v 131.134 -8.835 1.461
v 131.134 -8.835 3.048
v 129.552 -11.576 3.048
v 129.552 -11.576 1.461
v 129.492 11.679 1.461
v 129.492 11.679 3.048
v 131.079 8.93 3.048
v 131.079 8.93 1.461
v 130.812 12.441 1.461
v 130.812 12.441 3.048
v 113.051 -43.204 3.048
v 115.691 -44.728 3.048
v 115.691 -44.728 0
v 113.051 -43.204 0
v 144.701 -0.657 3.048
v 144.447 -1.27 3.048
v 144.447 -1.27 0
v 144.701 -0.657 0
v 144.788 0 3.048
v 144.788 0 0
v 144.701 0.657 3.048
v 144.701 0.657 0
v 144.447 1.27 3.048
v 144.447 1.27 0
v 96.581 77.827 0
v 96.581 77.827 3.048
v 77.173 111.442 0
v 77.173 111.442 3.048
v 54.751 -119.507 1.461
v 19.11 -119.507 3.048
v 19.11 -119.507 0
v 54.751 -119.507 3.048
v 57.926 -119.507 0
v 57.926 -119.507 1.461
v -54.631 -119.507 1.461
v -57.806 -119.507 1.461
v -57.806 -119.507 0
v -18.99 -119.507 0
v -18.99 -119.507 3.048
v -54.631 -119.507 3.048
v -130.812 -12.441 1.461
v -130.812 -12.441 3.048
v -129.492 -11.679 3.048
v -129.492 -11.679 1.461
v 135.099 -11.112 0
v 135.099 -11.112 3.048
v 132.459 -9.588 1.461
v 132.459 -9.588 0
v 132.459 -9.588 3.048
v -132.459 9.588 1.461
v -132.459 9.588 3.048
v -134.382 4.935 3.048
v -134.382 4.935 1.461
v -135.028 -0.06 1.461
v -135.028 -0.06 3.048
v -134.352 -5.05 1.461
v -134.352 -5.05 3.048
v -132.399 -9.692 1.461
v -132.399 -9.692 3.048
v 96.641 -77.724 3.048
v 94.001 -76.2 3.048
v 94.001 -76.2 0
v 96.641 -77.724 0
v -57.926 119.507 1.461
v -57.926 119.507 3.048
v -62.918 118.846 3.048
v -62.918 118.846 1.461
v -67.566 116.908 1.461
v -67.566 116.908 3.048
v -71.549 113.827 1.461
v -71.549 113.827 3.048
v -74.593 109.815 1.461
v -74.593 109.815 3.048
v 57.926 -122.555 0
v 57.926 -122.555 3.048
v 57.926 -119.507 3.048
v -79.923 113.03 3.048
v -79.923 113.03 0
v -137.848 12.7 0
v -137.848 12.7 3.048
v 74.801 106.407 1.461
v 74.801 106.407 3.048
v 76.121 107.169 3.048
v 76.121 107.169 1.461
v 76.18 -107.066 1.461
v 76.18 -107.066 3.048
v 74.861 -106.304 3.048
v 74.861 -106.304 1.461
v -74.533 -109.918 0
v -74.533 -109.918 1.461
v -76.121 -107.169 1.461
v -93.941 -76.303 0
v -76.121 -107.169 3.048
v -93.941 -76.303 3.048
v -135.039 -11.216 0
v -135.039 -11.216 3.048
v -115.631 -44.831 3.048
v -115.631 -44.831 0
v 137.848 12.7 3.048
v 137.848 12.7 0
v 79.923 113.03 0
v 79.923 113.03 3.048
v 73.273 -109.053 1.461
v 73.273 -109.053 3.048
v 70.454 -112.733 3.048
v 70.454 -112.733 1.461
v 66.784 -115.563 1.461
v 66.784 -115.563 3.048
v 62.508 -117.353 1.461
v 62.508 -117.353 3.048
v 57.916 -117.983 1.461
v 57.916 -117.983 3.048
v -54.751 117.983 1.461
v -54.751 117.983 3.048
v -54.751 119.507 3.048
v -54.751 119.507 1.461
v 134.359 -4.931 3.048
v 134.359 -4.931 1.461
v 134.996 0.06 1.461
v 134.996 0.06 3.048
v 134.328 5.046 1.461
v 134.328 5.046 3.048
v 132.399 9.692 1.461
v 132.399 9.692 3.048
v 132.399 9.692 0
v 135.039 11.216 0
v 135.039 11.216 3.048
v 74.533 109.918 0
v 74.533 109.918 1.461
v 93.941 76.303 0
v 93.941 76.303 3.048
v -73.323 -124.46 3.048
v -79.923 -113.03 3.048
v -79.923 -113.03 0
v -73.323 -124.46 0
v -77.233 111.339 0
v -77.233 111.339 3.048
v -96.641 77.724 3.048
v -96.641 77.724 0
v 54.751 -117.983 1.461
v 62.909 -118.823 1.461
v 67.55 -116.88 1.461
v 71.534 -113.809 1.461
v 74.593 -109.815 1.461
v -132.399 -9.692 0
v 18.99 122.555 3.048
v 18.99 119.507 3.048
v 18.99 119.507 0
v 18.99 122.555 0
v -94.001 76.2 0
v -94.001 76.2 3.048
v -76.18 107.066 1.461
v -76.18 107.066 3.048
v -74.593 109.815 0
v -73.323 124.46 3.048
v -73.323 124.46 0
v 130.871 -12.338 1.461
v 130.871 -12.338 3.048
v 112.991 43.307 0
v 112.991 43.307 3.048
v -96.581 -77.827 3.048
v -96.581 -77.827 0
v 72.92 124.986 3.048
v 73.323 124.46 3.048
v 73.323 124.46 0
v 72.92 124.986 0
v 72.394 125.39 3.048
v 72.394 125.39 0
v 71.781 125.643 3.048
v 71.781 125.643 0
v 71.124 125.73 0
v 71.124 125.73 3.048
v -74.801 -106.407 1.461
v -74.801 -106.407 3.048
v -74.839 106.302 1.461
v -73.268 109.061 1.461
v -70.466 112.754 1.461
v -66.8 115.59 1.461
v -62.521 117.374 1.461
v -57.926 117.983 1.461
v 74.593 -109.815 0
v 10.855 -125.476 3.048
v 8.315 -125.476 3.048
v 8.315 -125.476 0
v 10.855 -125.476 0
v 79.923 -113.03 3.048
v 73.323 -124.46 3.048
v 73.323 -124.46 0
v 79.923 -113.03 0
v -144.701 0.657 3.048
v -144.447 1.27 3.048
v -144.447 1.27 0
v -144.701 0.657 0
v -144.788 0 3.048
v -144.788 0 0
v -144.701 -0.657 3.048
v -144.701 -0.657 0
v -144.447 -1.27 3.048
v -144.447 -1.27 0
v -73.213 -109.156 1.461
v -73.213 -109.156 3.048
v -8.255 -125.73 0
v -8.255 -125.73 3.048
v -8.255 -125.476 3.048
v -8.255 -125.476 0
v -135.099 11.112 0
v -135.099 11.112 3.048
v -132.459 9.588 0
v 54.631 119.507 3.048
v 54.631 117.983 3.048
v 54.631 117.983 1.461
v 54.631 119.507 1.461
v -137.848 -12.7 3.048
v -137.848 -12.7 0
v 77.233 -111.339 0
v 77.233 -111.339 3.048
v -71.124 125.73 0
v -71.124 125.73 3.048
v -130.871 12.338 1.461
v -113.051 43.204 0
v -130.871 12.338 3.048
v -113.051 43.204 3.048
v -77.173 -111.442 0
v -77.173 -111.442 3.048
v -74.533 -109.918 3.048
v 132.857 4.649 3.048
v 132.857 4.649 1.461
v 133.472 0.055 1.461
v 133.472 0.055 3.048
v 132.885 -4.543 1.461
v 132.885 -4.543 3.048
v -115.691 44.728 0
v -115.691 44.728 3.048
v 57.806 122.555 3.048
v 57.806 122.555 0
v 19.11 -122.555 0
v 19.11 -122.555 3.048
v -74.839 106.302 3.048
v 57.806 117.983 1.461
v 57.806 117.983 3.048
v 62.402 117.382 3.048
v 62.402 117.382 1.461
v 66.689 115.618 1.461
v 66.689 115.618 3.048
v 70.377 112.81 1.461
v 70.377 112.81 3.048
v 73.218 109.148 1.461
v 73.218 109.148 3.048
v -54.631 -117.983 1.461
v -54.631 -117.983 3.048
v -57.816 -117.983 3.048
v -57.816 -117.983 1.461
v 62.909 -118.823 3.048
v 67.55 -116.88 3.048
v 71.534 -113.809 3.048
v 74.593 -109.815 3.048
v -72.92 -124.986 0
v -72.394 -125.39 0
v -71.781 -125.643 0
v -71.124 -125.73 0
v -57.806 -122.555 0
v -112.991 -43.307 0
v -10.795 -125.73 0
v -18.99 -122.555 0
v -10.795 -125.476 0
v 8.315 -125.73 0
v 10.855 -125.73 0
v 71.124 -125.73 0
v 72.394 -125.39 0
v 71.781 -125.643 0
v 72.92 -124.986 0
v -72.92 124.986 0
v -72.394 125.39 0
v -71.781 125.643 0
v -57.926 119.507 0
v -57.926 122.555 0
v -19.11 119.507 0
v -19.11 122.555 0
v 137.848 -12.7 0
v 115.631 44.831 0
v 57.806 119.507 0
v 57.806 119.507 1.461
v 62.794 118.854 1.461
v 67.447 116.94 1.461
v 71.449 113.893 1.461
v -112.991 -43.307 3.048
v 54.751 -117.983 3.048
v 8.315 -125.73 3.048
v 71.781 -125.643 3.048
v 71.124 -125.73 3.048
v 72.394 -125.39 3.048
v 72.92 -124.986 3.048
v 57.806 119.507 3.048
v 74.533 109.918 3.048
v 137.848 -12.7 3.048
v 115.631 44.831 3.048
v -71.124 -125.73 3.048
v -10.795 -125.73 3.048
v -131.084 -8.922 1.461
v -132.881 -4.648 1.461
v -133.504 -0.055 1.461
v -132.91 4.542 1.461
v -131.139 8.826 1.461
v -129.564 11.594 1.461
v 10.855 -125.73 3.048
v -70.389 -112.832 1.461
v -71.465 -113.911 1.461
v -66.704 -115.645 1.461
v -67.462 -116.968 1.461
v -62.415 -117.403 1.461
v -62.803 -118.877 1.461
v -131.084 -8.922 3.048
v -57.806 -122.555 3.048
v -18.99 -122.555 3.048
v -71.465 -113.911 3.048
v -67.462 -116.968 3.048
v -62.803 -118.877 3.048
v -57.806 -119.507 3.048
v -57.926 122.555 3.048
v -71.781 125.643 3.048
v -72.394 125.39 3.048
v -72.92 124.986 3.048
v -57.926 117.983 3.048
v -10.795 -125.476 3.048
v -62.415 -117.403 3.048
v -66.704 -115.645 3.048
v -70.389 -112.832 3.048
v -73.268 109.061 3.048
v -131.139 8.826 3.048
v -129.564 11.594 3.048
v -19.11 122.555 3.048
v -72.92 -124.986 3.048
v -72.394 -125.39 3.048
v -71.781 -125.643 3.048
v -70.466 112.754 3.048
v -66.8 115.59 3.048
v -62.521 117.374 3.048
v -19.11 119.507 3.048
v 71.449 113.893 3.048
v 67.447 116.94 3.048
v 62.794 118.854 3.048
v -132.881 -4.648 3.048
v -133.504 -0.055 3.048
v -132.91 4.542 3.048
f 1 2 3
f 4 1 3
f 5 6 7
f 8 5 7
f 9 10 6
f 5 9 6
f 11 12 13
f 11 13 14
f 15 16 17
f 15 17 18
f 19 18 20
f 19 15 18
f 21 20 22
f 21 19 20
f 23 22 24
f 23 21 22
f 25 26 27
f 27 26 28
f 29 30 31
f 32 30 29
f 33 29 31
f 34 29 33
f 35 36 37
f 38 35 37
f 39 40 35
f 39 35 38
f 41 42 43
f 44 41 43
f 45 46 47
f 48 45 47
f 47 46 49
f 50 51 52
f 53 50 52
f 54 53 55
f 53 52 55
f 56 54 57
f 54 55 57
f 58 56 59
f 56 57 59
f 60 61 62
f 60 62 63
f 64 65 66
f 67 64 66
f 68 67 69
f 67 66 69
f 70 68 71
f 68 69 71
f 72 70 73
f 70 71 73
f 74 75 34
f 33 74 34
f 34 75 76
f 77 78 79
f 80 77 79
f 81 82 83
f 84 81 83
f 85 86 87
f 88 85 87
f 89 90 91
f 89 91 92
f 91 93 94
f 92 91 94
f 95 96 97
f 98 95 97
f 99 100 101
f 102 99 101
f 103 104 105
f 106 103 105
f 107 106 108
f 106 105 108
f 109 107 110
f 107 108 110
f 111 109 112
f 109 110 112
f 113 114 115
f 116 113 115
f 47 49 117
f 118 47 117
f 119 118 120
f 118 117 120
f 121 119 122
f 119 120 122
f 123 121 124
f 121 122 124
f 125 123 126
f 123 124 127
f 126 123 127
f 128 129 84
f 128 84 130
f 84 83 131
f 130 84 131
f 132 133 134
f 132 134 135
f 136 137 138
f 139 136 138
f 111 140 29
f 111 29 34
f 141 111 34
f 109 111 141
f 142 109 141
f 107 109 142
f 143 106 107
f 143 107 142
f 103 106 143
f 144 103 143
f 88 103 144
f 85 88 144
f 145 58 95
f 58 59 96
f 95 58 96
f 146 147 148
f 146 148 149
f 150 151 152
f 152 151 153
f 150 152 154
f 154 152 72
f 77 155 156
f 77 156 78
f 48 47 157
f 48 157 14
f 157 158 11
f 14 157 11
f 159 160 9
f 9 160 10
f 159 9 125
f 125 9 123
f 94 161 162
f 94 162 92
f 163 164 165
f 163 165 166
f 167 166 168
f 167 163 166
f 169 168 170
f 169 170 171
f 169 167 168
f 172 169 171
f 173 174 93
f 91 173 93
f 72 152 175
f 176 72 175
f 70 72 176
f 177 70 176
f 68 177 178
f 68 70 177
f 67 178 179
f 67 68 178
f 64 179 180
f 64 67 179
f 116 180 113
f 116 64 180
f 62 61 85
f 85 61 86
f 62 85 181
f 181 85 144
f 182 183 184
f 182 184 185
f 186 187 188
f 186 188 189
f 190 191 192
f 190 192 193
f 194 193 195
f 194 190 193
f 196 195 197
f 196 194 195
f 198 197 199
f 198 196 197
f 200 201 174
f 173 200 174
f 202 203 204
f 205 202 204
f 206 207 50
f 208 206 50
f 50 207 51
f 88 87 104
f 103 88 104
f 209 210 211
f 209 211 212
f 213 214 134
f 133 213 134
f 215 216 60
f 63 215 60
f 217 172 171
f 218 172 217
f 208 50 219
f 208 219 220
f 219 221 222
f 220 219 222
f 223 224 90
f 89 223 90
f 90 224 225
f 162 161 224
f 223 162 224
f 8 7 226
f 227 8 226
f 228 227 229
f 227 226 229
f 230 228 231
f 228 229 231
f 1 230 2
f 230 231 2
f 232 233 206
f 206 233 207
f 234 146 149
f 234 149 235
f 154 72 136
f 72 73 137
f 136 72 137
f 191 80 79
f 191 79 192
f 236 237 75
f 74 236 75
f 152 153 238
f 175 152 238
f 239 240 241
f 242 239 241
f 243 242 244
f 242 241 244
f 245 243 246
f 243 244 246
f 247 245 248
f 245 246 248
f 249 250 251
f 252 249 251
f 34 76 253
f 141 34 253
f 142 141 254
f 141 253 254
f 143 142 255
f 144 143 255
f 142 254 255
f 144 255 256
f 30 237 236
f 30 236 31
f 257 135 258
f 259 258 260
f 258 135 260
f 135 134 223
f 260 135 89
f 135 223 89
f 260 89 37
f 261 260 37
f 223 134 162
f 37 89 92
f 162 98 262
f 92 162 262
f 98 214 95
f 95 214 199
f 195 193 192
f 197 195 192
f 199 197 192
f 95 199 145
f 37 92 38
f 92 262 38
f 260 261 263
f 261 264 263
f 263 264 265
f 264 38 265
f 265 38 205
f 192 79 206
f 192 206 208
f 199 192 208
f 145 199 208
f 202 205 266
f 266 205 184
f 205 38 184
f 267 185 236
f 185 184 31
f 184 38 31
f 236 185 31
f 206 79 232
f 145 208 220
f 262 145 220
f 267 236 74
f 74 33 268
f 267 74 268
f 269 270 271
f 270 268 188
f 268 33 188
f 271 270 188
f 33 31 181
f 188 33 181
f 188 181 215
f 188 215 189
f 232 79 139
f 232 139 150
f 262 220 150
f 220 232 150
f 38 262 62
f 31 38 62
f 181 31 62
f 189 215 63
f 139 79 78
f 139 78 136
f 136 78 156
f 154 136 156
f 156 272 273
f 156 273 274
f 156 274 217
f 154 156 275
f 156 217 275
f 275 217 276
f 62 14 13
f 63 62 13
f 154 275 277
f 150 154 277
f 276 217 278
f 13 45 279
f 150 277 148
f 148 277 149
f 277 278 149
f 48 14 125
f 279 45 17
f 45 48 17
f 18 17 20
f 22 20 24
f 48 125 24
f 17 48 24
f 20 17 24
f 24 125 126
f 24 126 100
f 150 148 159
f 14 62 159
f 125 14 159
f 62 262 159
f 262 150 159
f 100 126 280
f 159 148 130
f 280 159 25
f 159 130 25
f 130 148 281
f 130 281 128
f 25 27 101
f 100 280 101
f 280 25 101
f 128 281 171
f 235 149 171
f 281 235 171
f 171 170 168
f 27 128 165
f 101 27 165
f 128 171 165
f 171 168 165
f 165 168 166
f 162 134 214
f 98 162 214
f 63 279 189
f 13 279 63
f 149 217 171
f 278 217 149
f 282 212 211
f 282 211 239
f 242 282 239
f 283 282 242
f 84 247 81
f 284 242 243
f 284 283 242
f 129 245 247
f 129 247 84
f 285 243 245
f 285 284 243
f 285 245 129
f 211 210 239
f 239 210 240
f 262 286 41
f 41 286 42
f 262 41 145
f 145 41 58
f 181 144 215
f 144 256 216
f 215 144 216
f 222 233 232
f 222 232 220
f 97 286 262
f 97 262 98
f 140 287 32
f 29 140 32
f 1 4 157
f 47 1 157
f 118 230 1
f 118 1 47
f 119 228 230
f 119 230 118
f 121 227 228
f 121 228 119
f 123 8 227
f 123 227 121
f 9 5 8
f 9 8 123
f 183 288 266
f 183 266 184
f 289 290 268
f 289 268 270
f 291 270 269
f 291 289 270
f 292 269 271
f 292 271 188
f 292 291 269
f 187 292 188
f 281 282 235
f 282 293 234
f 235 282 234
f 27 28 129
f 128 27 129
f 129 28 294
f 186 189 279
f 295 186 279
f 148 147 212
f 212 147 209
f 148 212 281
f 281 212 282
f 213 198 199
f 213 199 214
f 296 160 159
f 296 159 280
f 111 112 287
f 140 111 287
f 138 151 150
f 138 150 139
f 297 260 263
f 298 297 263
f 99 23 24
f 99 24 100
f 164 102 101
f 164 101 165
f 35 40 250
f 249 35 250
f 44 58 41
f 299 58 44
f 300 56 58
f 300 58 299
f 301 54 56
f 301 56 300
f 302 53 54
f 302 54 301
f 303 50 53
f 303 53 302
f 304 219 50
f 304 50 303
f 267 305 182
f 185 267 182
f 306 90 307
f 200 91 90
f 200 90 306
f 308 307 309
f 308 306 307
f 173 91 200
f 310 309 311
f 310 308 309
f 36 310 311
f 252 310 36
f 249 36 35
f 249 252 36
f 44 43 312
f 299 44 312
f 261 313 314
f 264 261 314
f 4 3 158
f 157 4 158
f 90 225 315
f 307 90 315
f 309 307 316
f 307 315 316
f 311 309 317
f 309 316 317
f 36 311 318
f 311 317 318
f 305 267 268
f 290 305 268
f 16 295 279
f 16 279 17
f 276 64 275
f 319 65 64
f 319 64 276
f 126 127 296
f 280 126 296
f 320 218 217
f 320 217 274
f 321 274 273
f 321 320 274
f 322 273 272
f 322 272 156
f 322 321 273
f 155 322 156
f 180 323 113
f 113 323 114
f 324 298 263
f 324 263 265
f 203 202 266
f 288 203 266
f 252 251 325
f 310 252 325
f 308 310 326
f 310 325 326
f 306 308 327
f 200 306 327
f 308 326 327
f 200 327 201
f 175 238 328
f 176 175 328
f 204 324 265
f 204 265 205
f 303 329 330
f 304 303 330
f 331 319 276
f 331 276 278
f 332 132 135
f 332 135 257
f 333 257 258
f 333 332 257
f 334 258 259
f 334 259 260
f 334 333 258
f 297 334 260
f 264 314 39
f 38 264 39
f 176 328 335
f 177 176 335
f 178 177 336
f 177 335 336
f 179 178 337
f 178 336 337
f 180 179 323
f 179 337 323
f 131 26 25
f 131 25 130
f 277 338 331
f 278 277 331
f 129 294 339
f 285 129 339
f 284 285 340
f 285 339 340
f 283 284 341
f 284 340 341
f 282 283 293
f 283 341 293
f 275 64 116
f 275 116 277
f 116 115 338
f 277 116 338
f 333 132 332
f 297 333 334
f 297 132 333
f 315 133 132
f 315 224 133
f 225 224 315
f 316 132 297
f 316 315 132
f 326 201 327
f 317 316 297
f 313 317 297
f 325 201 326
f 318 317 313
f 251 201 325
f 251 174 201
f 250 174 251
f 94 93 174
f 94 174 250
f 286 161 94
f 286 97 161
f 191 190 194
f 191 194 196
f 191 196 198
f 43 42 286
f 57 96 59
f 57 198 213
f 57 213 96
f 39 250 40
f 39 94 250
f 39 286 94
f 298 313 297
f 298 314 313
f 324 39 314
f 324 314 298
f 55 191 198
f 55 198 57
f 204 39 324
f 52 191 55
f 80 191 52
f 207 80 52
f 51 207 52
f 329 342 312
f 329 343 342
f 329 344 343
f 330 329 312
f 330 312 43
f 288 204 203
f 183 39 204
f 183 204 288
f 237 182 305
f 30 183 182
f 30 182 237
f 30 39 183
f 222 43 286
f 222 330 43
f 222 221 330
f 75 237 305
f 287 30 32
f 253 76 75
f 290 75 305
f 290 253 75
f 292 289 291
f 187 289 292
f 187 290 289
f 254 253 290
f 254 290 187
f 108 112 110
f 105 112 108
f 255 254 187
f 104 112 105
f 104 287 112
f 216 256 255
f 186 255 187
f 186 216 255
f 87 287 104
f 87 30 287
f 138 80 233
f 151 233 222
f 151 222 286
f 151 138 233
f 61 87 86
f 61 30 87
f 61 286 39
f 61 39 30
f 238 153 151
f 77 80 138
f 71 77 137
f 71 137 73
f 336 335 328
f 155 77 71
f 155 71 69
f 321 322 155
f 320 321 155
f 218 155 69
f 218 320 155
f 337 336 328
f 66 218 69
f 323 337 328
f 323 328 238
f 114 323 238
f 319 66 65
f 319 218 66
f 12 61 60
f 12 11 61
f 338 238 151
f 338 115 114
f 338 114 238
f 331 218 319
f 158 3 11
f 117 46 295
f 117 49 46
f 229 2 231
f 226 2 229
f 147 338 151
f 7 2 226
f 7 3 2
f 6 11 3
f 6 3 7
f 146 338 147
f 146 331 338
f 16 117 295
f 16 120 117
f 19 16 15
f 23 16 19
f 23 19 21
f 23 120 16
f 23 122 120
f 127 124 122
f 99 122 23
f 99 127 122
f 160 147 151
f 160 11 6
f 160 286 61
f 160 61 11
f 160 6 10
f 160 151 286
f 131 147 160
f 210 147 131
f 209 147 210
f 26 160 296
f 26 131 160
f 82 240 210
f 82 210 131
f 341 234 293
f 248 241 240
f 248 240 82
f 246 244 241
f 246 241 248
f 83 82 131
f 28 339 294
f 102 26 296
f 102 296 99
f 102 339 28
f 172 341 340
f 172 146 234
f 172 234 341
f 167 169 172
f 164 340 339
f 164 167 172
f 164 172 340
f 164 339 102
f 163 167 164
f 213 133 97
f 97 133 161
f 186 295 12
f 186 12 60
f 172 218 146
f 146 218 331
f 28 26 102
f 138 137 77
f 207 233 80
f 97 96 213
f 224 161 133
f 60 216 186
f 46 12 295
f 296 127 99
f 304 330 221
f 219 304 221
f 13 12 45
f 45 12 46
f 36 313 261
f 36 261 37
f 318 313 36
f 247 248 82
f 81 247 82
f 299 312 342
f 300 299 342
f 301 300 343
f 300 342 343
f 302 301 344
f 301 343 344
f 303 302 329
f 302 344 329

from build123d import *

# Parameters (mm, degrees)
F1_DEPTH  = 3.048
F2_W      = 115.7319251503
F2_H      = 3.048
F3_DEPTH  = 3.049
F5_W      = 2.54
F5_H      = 0.254
F6_DEPTH  = 3.049
F8_DEPTH  = 3.048
F9_W      = 3.175
F9_H      = 1.524
F10_DEPTH = 1.5875
F11_W     = 38.1
F11_H     = 3.048
F12_DEPTH = 3.048


with BuildPart() as f1:
    # F0 (on Top) → F1 (new body)
    with BuildSketch(Plane.XY):
        with BuildLine():
            Line((-79.9225977639, 113.03), (-137.8481502717, 12.7))
            ThreePointArc((-137.8481502717, 12.7), (-141.2511050156, 0), (-137.8481502717, -12.7))
            Line((-137.8481502717, -12.7), (-79.9225977639, -113.03))
            ThreePointArc((-79.9225977639, -113.03), (-70.6255525078, -122.3270452561), (-57.9255525078, -125.73))
            Line((-57.9255525078, -125.73), (57.9255525078, -125.73))
            ThreePointArc((57.9255525078, -125.73), (70.6255525078, -122.3270452561), (79.9225977639, -113.03))
            Line((79.9225977639, -113.03), (137.8481502717, -12.7))
            ThreePointArc((137.8481502717, -12.7), (141.2511050156, 0), (137.8481502717, 12.7))
            Line((137.8481502717, 12.7), (79.9225977639, 113.03))
            ThreePointArc((79.9225977639, 113.03), (70.6255525078, 122.3270452561), (57.9255525078, 125.73))
            Line((57.9255525078, 125.73), (-57.9255525078, 125.73))
            ThreePointArc((-57.9255525078, 125.73), (-70.6255525078, 122.3270452561), (-79.9225977639, 113.03))
        make_face()
    extrude(amount=F1_DEPTH)

    # F2 (on face) → F3 (cut, through all)
    with BuildSketch(Plane.XY.offset(3.048)):
        Polygon((-135.0389296821, -11.215712791), (-77.1729671069, -111.4425), (-74.5333216761, -109.9185), (-132.3992842513, -9.6917127909), align=None)
        Polygon((-77.2325570395, 111.339287209), (-135.0985196147, 11.1125), (-132.4588741839, 9.5885), (-74.5929116088, 109.8152872091), align=None)
        with Locations((-0.0595899326, 121.031)):
            Rectangle(F2_W, F2_H)
        Polygon((135.0389296821, 11.215712791), (77.1729671069, 111.4425), (74.5333216761, 109.9185), (132.3992842513, 9.691712791), align=None)
        Polygon((77.2325570395, -111.339287209), (135.0985196147, -11.1125), (132.4588741839, -9.5885), (74.5929116088, -109.815287209), align=None)
        with Locations((0.0595899326, -121.031)):
            Rectangle(F2_W, F2_H)
    extrude(amount=-F3_DEPTH, mode=Mode.SUBTRACT)

    # F5 (on face) → F6 (cut, through all)
    with BuildSketch(Plane.XY.offset(3.048)):
        with Locations((-9.525, -125.603)):
            Rectangle(F5_W, F5_H)
        with Locations((9.5845899326, -125.603)):
            Rectangle(F5_W, F5_H)
    extrude(amount=-F6_DEPTH, mode=Mode.SUBTRACT)

    # F7 (on face) → F8 (join)
    with BuildSketch(Plane.XY.offset(3.048)):
        with BuildLine():
            Line((-73.3234841871, 124.46), (-79.9225977639, 113.03))
            Line((-79.9225977639, 113.03), (-57.9255525078, 125.73))
            Line((-57.9255525078, 125.73), (-71.1237796615, 125.73))
            ThreePointArc((-71.1237796615, 125.73), (-72.3937796615, 125.3897045256), (-73.3234841871, 124.46))
        make_face()
        with BuildLine():
            ThreePointArc((-137.8481502717, -12.7), (-141.2511050156, 0), (-137.8481502717, 12.7))
            Line((-137.8481502717, 12.7), (-144.4472638486, 1.27))
            ThreePointArc((-144.4472638486, 1.27), (-144.7875593229, 0), (-144.4472638486, -1.27))
            Line((-144.4472638486, -1.27), (-137.8481502717, -12.7))
        make_face()
        with BuildLine():
            ThreePointArc((-57.9255525078, -125.73), (-70.6255525078, -122.3270452561), (-79.9225977639, -113.03))
            Line((-79.9225977639, -113.03), (-73.3234841871, -124.46))
            ThreePointArc((-73.3234841871, -124.46), (-72.3937796615, -125.3897045256), (-71.1237796615, -125.73))
            Line((-71.1237796615, -125.73), (-57.9255525078, -125.73))
        make_face()
        with BuildLine():
            Line((73.3234841871, -124.46), (79.9225977639, -113.03))
            ThreePointArc((79.9225977639, -113.03), (70.6255525078, -122.3270452561), (57.9255525078, -125.73))
            Line((57.9255525078, -125.73), (71.1237796615, -125.73))
            ThreePointArc((71.1237796615, -125.73), (72.3937796615, -125.3897045256), (73.3234841871, -124.46))
        make_face()
        with BuildLine():
            Line((144.4472638486, 1.27), (137.8481502717, 12.7))
            ThreePointArc((137.8481502717, 12.7), (141.2511050156, 0), (137.8481502717, -12.7))
            Line((137.8481502717, -12.7), (144.4472638486, -1.27))
            ThreePointArc((144.4472638486, -1.27), (144.7875593229, 0), (144.4472638486, 1.27))
        make_face()
        with BuildLine():
            Line((71.1237796615, 125.73), (57.9255525078, 125.73))
            ThreePointArc((57.9255525078, 125.73), (70.6255525078, 122.3270452561), (79.9225977639, 113.03))
            Line((79.9225977639, 113.03), (73.3234841871, 124.46))
            ThreePointArc((73.3234841871, 124.46), (72.3937796615, 125.3897045256), (71.1237796615, 125.73))
        make_face()
    extrude(amount=-F8_DEPTH)

    # F9 (on face) → F10 (cut)
    with BuildSketch(Plane.XY.offset(3.048)):
        with BuildLine():
            Line((-57.9255525078, 117.983), (-57.9255525078, 119.507))
            ThreePointArc((-57.9255525078, 119.507), (-67.5657049473, 116.9079552121), (-74.5929116088, 109.8152872091))
            Line((-74.5929116088, 109.8152872091), (-73.2684038811, 109.0614601206))
            ThreePointArc((-73.2684038811, 109.0614601206), (-66.7996293906, 115.5904939256), (-57.9255525078, 117.983))
        make_face()
        with Locations((-56.3380525078, 118.745)):
            Rectangle(F9_W, F9_H)
        Polygon((-73.2684038811, 109.0614601206), (-74.5929116088, 109.8152872091), (-76.1804116088, 107.065656552), (-74.8388469782, 106.3021217395), align=None)
        with BuildLine():
            Line((73.2182344036, 109.1483562046), (74.5333216761, 109.9185))
            ThreePointArc((74.5333216761, 109.9185), (67.446525082, 116.9398894425), (57.8063726425, 119.507))
            Line((57.8063726425, 119.507), (57.8063726425, 117.983))
            ThreePointArc((57.8063726425, 117.983), (66.6886079177, 115.6177179059), (73.2182344036, 109.1483562046))
        make_face()
        Polygon((76.1208216761, 107.168869343), (74.5333216761, 109.9185), (73.2182344036, 109.1483562046), (74.801024176, 106.406883901), align=None)
        with Locations((56.2188726425, 118.745)):
            Rectangle(F9_W, F9_H)
        with BuildLine():
            Line((-131.1390514686, 8.8265), (-132.4588741839, 9.5885))
            ThreePointArc((-132.4588741839, 9.5885), (-135.0281115918, -0.0596393029), (-132.3992842513, -9.6917127909))
            Line((-132.3992842513, -9.6917127909), (-131.0841969788, -8.9215689955))
            ThreePointArc((-131.0841969788, -8.9215689955), (-133.5041188708, -0.0549290528), (-131.1390514686, 8.8265))
        make_face()
        Polygon((-130.8713741839, 12.338130657), (-132.4588741839, 9.5885), (-131.1390514686, 8.8265), (-129.563948664, 11.5940256944), align=None)
        Polygon((-131.0841969788, -8.9215689955), (-132.3992842513, -9.6917127909), (-130.8117842513, -12.4413434479), (-129.4919867512, -11.679358006), align=None)
        with BuildLine():
            Line((-73.2134989608, -109.1565), (-74.5333216761, -109.9185))
            ThreePointArc((-74.5333216761, -109.9185), (-67.4624066445, -116.9675945149), (-57.8063726425, -119.507))
            Line((-57.8063726425, -119.507), (-57.8157930976, -117.983029116))
            ThreePointArc((-57.8157930976, -117.983029116), (-66.7044894803, -115.6454229784), (-73.2134989608, -109.1565))
        make_face()
        Polygon((-76.1208216761, -107.1688693429), (-74.5333216761, -109.9185), (-73.2134989608, -109.1565), (-74.8009989608, -106.4068693429), align=None)
        Polygon((-57.8157930976, -117.983029116), (-57.8063726425, -119.507), (-54.6313726425, -119.507), (-54.6313726425, -117.983029116), align=None)
        with BuildLine():
            Line((57.9161320527, -117.983029116), (57.9255525078, -119.507))
            ThreePointArc((57.9255525078, -119.507), (67.5496524319, -116.8803488392), (74.5929116088, -109.815287209))
            Line((74.5929116088, -109.815287209), (73.2730888934, -109.053287209))
            ThreePointArc((73.2730888934, -109.053287209), (66.7835768752, -115.5628875527), (57.9161320527, -117.983029116))
        make_face()
        Polygon((54.7505525078, -119.507), (57.9255525078, -119.507), (57.9161320527, -117.983029116), (54.7505525078, -117.983029116), align=None)
        Polygon((73.2730888934, -109.053287209), (74.5929116088, -109.815287209), (76.1804116088, -107.065656552), (74.8605888934, -106.303656552), align=None)
        with BuildLine():
            Line((131.1343664563, -8.8346729115), (132.4588741839, -9.5885))
            ThreePointArc((132.4588741839, -9.5885), (134.9961775139, 0.0595406033), (132.3992842513, 9.691712791))
            Line((132.3992842513, 9.691712791), (131.0794615359, 8.929712791))
            ThreePointArc((131.0794615359, 8.929712791), (133.4721847929, 0.0548303532), (131.1343664563, -8.8346729115))
        make_face()
        Polygon((130.8713741839, -12.338130657), (132.4588741839, -9.5885), (131.1343664563, -8.8346729115), (129.5515766838, -11.576145215), align=None)
        Polygon((131.0794615359, 8.929712791), (132.3992842513, 9.691712791), (130.8117842513, 12.441343448), (129.4919615359, 11.679343448), align=None)
    extrude(amount=-F10_DEPTH, mode=Mode.SUBTRACT)

    # F11 (on face) → F12 (join, through all)
    with BuildSketch(Plane.XY.offset(3.048)):
        with Locations((-0.0595899326, 121.031)):
            Rectangle(F11_W, F11_H)
        Polygon((-96.6405383271, 77.7236775466), (-115.6905383271, 44.7281096624), (-113.0508928964, 43.2041096624), (-94.0008928964, 76.1996775466), align=None)
        Polygon((-115.6309483945, -44.8313224534), (-96.5809483945, -77.8268903376), (-93.9413029637, -76.3028903376), (-112.9913029637, -43.3073224534), align=None)
        with Locations((0.0595899326, -121.031)):
            Rectangle(F11_W, F11_H)
        Polygon((96.6405383271, -77.7236775466), (115.6905383271, -44.7281096624), (113.0508928964, -43.2041096624), (94.0008928964, -76.1996775466), align=None)
        Polygon((115.6309483945, 44.8313224534), (96.5809483945, 77.8268903376), (93.9413029637, 76.3028903376), (112.9913029637, 43.3073224534), align=None)
    extrude(amount=-F12_DEPTH)


solid = f1.part
